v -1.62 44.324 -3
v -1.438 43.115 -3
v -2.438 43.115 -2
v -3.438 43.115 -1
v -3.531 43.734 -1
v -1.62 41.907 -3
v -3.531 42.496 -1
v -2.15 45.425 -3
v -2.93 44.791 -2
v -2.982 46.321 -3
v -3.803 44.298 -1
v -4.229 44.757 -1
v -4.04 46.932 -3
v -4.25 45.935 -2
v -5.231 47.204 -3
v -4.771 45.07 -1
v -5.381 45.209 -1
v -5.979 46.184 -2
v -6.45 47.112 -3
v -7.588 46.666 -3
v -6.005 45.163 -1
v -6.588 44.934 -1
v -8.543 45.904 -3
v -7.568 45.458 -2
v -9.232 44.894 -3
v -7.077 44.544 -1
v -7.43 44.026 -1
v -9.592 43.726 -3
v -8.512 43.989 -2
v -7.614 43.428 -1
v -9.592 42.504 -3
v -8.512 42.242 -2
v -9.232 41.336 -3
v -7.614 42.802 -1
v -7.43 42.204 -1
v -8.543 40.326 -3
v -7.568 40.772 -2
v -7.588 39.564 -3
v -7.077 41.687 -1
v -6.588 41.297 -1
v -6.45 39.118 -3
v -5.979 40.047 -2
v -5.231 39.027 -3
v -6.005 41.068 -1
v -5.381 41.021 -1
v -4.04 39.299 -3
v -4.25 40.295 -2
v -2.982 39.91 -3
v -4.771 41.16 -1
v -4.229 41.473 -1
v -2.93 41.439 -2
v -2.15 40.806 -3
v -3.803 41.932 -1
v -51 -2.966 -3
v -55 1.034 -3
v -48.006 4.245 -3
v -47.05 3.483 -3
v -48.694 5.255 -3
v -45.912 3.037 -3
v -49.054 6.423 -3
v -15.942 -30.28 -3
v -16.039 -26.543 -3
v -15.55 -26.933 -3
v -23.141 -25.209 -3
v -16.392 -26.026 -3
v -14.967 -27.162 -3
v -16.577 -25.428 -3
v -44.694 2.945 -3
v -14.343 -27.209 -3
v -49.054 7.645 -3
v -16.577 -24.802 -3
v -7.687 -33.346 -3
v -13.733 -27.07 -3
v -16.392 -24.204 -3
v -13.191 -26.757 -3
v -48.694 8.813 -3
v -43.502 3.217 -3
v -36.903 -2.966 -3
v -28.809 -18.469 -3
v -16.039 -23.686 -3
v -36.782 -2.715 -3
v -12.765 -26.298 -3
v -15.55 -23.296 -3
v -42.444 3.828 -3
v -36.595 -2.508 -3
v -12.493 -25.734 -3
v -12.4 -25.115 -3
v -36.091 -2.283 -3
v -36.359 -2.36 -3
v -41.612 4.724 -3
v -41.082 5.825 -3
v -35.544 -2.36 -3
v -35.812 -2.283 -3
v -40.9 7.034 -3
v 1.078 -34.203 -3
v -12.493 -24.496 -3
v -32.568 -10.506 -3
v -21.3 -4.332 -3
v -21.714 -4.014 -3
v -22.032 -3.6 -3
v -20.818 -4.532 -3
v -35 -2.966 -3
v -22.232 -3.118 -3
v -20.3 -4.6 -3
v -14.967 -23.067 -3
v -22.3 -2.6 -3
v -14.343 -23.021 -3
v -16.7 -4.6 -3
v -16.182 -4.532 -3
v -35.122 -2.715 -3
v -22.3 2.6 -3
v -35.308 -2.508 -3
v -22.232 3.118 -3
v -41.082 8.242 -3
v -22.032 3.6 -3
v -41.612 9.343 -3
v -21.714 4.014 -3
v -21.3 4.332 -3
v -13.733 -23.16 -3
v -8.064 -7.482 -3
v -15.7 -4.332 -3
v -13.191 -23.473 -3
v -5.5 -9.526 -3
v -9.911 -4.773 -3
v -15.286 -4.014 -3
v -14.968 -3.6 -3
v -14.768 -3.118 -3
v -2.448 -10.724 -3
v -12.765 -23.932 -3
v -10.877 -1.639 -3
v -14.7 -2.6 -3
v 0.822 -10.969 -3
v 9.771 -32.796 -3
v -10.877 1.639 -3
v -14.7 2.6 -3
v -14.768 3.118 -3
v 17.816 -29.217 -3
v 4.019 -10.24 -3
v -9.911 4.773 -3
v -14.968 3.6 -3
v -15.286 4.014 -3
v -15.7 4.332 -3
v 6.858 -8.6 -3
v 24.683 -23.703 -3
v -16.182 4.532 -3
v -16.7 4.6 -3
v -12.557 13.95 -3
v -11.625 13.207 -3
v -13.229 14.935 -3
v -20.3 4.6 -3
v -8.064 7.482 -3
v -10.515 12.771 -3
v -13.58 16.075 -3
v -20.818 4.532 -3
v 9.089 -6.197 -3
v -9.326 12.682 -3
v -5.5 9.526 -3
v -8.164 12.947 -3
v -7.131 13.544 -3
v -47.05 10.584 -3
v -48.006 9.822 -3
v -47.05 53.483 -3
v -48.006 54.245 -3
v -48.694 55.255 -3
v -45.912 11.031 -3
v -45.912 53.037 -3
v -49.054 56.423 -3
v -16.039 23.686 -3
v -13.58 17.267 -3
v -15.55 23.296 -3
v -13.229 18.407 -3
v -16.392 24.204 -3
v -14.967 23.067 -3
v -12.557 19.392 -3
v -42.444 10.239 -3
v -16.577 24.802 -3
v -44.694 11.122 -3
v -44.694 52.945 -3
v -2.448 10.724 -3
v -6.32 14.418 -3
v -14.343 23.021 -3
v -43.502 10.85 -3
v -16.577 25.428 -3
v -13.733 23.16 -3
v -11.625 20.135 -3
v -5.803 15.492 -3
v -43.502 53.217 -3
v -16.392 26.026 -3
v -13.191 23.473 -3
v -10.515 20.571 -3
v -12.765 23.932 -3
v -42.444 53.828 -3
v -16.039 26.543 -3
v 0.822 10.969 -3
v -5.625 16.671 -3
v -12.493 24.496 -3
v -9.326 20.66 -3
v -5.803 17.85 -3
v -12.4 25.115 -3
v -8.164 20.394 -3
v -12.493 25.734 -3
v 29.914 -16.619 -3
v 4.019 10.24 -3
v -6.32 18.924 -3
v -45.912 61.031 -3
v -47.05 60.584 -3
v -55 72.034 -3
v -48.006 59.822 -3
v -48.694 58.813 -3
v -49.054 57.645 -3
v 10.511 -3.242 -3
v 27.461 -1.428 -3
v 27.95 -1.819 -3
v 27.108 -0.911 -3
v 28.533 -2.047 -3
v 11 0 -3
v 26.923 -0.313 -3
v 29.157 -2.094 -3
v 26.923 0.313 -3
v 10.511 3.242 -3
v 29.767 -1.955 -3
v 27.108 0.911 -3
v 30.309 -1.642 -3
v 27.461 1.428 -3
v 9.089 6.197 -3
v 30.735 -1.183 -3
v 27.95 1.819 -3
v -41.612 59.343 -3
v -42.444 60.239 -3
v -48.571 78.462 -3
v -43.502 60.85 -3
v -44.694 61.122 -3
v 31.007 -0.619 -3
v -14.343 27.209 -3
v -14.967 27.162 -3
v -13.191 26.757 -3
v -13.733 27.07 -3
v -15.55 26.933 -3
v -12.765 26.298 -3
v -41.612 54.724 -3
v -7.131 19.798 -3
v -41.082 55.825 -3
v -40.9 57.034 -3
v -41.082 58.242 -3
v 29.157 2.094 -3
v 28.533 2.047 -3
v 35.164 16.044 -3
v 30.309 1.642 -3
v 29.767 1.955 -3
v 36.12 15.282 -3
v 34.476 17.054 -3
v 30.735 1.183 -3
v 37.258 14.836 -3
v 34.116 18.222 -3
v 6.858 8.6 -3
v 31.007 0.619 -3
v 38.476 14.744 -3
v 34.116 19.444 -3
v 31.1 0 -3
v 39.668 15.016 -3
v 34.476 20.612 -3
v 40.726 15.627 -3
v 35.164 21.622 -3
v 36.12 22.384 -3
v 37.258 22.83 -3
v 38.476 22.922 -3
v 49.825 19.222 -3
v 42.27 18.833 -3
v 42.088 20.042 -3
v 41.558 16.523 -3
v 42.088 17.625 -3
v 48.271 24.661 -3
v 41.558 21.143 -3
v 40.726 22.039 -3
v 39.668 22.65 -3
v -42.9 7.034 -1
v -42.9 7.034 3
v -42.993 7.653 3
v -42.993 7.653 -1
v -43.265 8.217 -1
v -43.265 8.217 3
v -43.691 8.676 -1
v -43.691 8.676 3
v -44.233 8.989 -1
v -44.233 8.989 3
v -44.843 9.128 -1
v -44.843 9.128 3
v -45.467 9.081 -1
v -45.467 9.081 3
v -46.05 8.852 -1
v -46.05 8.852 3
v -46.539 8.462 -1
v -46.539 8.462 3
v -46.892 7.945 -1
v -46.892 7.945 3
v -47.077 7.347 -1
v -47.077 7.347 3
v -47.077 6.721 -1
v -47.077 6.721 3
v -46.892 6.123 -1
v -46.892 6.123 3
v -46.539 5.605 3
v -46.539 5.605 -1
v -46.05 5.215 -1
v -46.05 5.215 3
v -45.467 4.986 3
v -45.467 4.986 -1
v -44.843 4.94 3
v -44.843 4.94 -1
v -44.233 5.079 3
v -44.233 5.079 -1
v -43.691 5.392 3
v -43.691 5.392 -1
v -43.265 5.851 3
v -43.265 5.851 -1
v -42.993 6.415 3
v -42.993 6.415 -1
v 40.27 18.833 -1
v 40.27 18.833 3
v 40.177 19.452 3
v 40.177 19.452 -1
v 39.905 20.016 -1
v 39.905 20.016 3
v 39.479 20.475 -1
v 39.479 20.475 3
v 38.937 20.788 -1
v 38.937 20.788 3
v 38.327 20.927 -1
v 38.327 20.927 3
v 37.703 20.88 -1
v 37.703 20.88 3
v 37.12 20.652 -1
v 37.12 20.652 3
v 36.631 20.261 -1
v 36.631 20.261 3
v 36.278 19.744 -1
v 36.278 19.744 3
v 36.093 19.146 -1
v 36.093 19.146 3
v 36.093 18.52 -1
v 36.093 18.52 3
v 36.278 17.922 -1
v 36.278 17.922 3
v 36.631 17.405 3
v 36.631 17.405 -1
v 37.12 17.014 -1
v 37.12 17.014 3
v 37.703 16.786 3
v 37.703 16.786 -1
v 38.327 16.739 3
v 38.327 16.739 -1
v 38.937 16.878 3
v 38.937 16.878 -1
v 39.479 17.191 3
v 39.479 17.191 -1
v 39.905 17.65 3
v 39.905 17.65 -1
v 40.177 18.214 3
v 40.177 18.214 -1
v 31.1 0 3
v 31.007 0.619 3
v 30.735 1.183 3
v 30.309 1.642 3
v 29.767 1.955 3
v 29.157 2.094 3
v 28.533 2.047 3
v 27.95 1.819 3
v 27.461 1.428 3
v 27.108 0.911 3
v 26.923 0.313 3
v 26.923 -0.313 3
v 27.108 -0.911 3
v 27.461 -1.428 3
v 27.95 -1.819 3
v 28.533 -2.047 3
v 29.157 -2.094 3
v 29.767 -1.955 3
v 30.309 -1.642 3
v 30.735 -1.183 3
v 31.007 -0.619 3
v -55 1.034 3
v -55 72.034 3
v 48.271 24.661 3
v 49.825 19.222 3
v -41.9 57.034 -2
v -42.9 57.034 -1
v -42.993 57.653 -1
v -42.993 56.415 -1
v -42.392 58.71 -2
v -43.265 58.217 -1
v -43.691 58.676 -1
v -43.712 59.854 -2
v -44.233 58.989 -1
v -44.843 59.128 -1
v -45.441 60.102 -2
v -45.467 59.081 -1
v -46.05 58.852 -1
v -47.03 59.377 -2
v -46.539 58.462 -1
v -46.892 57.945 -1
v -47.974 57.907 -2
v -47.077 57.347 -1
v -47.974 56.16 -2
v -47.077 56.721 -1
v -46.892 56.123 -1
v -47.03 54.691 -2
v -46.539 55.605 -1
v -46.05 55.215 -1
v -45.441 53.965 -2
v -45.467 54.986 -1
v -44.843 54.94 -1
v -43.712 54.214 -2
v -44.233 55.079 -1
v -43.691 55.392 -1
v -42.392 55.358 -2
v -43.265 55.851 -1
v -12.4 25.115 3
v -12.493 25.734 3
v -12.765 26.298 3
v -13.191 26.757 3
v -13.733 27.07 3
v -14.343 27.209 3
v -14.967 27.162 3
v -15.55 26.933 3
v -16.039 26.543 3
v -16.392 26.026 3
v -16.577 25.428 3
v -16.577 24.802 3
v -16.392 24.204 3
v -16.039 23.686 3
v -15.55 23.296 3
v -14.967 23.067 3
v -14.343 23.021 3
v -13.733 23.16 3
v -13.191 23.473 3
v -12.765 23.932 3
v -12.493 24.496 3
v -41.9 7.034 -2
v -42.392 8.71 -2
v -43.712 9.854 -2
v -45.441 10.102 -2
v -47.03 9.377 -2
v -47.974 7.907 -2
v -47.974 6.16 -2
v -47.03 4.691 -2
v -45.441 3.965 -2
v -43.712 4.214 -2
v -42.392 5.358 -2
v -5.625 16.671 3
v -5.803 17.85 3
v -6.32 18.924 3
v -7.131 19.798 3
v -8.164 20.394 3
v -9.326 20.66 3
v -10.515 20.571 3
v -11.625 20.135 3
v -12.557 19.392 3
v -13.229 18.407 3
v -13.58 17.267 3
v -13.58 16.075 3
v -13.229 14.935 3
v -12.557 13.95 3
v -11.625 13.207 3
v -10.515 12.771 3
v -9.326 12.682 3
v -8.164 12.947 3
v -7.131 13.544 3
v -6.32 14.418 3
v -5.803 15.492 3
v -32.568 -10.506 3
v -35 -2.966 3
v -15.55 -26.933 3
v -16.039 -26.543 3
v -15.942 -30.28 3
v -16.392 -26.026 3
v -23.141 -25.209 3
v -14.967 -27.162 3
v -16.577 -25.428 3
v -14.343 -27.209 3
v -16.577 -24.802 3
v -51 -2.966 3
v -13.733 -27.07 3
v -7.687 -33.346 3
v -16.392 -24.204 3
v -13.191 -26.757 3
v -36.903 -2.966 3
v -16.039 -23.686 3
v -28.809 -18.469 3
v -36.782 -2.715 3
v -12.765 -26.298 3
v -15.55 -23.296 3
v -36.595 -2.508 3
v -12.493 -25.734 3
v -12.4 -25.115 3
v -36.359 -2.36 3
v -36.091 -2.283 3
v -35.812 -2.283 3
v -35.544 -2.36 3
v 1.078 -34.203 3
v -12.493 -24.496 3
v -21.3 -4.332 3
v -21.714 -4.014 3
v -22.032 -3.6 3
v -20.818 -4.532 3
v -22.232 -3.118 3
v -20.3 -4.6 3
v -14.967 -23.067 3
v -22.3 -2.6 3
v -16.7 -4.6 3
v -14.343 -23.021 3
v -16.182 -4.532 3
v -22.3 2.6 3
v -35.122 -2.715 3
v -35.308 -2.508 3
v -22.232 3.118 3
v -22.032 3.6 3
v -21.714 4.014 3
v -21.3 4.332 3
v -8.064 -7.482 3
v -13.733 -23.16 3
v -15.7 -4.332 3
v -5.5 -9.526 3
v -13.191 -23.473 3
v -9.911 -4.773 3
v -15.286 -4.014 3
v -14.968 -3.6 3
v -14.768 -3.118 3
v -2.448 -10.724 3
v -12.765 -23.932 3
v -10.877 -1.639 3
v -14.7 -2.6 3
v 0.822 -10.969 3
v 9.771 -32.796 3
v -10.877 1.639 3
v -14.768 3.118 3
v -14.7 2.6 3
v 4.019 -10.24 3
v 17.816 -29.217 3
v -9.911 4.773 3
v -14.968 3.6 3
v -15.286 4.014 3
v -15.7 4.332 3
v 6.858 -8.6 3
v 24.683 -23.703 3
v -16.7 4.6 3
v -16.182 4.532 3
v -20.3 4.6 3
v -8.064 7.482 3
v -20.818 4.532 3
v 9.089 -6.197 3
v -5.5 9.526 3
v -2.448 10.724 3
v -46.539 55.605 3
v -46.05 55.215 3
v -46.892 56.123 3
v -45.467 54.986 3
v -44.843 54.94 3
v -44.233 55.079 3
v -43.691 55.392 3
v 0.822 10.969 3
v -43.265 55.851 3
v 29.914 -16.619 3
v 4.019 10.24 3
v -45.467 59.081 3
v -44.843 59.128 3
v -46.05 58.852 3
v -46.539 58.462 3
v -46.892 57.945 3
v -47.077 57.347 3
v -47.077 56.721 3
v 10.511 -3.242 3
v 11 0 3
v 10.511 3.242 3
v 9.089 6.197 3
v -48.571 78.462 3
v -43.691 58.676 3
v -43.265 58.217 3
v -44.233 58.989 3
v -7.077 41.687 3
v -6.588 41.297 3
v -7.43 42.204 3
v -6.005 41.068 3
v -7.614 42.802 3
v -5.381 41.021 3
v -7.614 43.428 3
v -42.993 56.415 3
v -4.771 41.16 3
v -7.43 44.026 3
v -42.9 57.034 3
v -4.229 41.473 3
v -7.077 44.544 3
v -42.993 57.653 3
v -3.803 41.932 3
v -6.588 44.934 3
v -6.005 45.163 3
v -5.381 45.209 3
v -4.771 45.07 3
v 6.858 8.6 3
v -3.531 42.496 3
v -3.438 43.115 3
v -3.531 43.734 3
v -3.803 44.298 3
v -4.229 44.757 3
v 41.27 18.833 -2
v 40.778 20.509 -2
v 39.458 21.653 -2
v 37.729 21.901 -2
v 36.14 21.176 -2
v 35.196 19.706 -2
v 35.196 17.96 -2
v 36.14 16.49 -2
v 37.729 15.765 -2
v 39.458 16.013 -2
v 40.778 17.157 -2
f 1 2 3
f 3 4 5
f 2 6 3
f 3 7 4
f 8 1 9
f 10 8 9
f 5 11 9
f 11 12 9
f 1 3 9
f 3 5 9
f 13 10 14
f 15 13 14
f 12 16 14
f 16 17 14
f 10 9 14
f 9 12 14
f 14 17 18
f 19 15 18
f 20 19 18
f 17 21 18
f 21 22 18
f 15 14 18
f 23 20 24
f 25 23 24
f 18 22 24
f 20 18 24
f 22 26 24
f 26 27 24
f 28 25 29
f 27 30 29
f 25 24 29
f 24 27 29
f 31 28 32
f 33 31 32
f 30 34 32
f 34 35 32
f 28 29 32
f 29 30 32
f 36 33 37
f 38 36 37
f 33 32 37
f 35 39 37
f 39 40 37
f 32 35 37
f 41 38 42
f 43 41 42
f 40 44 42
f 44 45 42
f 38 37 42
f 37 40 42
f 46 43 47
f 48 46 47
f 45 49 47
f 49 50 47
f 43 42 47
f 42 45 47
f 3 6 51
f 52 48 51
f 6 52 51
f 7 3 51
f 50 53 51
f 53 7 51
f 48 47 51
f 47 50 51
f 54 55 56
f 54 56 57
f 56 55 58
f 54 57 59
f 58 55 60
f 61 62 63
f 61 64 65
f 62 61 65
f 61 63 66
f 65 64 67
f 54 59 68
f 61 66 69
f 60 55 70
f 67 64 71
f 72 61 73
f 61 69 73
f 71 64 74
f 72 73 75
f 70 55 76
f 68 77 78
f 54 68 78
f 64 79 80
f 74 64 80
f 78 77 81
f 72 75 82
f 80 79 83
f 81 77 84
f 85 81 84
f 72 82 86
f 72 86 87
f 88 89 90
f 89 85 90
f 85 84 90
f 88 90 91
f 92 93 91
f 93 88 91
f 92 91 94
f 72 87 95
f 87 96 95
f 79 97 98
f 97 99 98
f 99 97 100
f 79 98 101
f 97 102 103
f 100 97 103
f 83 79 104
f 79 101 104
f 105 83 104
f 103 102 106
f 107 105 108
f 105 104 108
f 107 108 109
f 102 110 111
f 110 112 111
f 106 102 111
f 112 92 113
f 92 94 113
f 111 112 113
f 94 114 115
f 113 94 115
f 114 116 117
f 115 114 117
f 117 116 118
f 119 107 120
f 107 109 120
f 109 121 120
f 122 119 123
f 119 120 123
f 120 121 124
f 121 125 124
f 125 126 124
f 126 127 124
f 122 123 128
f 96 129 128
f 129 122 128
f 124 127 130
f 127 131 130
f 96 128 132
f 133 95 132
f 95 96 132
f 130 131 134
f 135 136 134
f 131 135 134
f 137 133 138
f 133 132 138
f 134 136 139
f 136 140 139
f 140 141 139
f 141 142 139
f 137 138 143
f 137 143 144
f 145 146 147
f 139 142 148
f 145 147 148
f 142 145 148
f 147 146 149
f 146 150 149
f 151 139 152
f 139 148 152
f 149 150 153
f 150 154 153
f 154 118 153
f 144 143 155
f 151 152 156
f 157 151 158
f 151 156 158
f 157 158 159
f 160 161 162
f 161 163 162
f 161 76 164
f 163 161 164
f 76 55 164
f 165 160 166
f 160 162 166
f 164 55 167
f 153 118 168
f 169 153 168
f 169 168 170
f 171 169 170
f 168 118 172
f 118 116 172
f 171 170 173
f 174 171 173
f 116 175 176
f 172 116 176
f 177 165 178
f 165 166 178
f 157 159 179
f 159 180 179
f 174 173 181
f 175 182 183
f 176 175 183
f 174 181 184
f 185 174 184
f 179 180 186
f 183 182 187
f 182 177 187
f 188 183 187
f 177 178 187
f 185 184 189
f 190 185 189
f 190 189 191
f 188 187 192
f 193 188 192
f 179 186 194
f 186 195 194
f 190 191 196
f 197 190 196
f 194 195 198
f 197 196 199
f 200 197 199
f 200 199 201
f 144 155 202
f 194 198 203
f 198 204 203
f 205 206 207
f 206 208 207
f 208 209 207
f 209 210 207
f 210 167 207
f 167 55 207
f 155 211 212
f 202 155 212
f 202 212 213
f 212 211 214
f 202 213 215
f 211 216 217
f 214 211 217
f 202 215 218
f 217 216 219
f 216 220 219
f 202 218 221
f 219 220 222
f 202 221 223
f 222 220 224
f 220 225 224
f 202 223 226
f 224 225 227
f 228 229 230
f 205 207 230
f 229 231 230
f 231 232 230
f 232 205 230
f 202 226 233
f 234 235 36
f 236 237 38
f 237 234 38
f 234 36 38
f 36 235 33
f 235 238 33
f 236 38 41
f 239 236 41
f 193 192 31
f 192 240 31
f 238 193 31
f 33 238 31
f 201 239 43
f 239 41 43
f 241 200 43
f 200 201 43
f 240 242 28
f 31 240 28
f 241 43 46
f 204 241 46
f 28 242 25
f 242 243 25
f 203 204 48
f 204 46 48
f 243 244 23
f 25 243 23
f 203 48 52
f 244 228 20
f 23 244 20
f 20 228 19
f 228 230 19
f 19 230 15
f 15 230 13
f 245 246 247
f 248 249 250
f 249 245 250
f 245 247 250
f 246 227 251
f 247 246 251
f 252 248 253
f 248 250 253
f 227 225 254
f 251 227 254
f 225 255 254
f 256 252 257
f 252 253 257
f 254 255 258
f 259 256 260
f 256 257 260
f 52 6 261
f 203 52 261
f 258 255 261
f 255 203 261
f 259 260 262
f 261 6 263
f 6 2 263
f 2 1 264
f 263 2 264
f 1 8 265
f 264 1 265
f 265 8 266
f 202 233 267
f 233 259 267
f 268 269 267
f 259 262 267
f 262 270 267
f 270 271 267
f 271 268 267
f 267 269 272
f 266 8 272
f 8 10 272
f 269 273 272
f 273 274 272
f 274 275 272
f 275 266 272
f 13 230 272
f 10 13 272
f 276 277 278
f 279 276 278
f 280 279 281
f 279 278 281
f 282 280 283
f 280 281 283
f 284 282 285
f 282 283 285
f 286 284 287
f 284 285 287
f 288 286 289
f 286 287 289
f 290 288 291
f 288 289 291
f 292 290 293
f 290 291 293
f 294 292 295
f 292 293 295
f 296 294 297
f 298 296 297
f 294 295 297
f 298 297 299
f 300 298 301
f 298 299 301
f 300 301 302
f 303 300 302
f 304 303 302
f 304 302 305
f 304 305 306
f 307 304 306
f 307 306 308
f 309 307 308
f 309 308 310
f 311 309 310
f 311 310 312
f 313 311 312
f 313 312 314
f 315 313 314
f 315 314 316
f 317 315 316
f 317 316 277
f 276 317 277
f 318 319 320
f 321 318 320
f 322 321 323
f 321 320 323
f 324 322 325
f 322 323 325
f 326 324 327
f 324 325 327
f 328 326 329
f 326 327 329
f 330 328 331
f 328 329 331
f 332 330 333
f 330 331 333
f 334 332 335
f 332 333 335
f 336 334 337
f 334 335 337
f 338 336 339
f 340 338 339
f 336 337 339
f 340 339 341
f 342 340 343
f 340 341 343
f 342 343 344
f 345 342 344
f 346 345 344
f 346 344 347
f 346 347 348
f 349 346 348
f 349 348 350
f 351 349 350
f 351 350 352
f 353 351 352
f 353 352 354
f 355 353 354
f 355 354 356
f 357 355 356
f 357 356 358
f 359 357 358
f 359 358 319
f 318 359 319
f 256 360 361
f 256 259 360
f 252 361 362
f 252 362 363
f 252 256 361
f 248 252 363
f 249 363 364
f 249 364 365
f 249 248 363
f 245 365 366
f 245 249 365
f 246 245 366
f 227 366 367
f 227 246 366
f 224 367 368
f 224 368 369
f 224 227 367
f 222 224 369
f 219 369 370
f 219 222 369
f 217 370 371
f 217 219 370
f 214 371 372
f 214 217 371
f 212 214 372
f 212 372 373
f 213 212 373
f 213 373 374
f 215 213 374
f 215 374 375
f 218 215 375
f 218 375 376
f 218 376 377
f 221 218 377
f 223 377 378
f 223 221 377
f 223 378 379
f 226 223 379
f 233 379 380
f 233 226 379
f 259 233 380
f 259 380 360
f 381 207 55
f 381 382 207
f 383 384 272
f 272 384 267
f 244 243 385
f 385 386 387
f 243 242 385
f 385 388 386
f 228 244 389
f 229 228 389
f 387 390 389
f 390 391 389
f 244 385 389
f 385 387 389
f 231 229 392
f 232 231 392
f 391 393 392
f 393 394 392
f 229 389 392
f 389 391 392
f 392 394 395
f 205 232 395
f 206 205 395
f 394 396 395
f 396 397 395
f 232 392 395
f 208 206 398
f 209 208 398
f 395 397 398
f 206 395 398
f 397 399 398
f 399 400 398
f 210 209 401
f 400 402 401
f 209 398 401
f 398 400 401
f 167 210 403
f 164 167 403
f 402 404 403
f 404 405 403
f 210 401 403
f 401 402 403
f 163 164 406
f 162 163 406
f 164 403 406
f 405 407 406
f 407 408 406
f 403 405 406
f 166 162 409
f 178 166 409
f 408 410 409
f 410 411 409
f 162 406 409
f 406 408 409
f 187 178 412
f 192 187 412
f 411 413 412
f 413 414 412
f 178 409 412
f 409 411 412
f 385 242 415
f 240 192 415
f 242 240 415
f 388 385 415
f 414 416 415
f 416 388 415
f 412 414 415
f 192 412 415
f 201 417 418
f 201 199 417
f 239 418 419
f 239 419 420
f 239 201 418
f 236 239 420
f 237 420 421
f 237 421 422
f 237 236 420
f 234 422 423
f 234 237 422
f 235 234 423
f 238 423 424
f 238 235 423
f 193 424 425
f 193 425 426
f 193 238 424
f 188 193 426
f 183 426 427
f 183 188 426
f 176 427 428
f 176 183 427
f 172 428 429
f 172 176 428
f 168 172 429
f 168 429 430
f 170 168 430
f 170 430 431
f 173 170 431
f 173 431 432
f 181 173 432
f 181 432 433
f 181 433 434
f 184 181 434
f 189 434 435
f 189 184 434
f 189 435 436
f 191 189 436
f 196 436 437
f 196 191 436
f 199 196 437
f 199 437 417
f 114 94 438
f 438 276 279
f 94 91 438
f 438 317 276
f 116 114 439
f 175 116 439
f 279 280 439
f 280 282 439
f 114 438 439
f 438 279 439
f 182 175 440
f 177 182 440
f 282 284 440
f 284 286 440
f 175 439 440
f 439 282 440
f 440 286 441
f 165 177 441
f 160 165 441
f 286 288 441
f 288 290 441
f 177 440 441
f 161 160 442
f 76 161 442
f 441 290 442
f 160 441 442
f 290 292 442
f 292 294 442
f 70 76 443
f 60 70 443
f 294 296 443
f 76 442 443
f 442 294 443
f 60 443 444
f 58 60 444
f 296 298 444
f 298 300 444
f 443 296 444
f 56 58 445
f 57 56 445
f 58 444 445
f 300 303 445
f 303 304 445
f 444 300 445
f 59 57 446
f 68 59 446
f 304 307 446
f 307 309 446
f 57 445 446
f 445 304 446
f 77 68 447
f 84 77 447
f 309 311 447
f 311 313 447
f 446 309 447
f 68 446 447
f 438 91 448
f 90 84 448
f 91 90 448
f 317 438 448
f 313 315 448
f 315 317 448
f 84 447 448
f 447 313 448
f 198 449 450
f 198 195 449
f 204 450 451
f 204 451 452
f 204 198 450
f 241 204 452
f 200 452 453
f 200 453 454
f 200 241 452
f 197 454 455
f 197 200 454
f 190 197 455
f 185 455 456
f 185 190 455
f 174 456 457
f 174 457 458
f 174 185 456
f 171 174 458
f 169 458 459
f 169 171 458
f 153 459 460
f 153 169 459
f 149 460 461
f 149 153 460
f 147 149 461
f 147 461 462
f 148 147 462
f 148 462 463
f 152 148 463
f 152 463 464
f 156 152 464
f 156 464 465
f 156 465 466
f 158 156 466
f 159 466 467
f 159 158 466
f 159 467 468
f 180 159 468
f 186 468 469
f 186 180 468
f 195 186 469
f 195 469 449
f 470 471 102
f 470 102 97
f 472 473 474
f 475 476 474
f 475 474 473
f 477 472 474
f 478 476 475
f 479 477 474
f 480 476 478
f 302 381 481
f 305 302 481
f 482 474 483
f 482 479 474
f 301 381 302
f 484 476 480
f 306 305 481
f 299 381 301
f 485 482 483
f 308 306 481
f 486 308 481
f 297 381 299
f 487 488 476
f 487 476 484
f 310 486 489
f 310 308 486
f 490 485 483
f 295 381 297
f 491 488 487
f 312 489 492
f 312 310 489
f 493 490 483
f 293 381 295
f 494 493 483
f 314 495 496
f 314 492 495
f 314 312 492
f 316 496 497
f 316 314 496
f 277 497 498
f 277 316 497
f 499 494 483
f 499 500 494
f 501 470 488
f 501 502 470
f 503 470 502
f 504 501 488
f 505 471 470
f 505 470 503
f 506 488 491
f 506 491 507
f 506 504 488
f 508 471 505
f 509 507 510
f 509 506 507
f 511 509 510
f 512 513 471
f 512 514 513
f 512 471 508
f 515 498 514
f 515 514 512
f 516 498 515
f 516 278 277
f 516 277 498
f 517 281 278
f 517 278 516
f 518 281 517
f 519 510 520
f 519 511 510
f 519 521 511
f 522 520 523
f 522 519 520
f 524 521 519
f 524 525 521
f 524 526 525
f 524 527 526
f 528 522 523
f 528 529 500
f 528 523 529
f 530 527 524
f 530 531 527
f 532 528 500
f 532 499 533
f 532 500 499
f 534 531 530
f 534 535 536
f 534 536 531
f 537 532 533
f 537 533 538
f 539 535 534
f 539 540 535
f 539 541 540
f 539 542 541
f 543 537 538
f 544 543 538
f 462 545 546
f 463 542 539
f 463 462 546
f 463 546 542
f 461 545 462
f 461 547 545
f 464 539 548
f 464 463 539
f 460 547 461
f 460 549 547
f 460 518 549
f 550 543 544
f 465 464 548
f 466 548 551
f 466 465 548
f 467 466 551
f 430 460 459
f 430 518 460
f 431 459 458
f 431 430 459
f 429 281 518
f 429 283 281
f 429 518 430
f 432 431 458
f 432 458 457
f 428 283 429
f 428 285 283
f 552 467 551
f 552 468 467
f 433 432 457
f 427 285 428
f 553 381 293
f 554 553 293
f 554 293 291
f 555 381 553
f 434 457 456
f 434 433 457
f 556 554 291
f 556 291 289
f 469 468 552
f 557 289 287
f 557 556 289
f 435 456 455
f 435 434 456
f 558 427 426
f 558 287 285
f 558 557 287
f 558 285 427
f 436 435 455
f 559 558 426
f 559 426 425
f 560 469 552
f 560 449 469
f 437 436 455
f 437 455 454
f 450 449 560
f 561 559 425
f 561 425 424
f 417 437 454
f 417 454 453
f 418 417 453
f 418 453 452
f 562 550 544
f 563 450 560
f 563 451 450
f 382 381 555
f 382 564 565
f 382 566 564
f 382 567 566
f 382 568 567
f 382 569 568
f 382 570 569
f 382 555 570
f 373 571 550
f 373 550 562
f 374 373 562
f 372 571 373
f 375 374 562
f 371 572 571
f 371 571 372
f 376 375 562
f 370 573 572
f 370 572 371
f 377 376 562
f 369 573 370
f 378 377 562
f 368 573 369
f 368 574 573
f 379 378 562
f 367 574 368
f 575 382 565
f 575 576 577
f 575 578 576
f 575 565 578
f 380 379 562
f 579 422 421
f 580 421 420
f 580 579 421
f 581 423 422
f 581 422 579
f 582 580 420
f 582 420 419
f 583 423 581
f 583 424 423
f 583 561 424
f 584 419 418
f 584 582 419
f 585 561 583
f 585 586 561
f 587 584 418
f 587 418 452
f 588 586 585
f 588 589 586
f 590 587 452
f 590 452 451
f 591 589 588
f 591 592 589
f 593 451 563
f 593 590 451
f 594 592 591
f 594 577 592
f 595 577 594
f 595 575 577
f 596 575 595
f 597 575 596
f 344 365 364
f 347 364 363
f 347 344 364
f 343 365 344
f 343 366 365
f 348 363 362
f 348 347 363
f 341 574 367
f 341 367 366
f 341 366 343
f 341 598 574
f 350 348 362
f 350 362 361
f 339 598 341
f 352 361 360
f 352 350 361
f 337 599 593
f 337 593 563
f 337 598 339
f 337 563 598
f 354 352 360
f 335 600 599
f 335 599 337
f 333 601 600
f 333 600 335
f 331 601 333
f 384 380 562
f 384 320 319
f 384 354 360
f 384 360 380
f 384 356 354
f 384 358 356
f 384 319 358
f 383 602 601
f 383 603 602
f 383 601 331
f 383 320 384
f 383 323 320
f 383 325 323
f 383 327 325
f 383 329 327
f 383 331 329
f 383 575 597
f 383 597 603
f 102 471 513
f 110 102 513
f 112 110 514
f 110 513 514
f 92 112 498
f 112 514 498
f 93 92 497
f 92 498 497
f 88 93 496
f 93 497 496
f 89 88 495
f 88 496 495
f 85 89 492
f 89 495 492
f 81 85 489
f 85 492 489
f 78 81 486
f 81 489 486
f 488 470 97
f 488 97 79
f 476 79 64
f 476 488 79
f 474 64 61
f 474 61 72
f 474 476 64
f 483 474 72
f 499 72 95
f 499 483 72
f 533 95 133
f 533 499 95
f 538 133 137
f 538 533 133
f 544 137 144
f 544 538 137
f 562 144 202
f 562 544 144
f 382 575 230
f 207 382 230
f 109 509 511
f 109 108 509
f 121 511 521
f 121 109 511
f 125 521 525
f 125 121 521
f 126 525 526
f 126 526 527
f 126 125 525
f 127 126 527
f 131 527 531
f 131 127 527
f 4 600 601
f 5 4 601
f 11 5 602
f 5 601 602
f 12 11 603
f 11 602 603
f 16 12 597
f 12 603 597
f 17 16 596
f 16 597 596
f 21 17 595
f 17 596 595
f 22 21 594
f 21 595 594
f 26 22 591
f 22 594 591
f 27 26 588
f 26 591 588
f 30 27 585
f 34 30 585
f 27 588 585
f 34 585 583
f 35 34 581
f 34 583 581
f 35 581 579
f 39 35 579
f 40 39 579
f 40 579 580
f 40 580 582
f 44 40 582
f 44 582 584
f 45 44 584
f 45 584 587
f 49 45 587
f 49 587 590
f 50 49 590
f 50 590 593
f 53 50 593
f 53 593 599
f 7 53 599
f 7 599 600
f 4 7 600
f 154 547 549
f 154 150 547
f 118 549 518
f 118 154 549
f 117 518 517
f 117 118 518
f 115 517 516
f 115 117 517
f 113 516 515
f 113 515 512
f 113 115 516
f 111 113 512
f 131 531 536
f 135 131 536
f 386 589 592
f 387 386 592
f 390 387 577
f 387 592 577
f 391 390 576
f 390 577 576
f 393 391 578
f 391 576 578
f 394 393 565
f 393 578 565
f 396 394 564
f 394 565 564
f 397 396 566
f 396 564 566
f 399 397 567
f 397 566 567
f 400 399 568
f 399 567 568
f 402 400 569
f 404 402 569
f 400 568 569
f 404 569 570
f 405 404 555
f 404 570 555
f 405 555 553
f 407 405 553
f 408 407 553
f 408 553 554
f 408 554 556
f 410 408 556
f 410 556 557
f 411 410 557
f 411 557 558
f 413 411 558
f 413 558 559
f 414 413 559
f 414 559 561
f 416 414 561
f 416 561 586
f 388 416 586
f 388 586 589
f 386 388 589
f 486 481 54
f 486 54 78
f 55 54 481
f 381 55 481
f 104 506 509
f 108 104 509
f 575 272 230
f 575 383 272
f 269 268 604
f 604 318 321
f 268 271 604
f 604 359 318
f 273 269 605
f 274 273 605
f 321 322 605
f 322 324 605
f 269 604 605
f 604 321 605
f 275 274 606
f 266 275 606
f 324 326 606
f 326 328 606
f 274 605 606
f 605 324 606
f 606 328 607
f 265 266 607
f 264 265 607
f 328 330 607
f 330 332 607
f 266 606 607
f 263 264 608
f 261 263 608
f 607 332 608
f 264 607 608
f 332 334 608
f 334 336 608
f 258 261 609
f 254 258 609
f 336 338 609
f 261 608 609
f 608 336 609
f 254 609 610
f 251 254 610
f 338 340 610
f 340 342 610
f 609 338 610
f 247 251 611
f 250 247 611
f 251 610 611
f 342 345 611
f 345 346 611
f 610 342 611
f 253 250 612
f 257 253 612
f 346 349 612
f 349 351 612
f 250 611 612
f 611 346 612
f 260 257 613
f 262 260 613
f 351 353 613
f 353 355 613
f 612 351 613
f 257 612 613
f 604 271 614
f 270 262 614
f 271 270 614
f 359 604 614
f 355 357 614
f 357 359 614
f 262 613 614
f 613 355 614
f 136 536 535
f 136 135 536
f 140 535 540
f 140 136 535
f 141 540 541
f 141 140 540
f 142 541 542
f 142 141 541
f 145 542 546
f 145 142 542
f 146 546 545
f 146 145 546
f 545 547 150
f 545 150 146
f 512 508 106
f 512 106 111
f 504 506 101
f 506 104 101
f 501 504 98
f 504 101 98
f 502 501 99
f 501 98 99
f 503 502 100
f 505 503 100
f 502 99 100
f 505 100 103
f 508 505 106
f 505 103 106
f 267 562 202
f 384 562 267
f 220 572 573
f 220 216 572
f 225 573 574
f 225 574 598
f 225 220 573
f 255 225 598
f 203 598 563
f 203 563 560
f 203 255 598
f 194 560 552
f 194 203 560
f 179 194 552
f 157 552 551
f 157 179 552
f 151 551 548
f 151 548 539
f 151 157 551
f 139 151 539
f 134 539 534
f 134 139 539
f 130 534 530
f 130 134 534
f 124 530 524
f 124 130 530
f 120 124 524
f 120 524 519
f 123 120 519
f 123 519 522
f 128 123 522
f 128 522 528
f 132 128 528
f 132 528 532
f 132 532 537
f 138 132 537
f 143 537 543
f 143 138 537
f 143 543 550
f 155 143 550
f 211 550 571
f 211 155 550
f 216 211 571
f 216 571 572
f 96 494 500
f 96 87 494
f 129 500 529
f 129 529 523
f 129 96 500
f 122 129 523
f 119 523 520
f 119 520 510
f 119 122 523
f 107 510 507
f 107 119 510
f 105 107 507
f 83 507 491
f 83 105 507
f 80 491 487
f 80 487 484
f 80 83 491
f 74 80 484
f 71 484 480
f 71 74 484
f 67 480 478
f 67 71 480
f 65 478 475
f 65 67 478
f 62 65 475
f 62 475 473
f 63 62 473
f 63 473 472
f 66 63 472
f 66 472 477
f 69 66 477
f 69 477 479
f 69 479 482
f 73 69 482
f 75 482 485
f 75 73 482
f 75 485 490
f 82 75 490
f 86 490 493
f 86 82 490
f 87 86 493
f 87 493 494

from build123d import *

# Parameters (mm, degrees)
SKETCH_1_R          = 2.1
SKETCH_1_R_2        = 4
SKETCH_1_R_3        = 11
EXTRUDE_1_DEPTH     = 3
SKETCH_3_R          = 1
SKETCH_3_R_2        = 2.1
CUT_EXTRUDE_1_DEPTH = 99.947101842
CHAMFER_2_SIZE      = 4
CHAMFER_3_SIZE      = 10
CHAMFER_3_SIZE2     = 7.354021529
SKETCH_4_W          = 7.6
SKETCH_4_H          = 9.2
CUT_EXTRUDE_2_DEPTH = 97.00692173
FILLET_1_R          = 2
SKETCH_5_R          = 2.1
CUT_EXTRUDE_3_DEPTH = 97.00692173
CHAMFER_1_SIZE      = 2


with BuildPart() as part:
    # 草图1 → 凸台-拉伸1 (new, symmetric)
    with BuildSketch(Plane.XY):
        with BuildLine():
            Line((-55, 82.03370626), (-55, -2.96629374))
            Line((-55, -2.96629374), (-35, -2.96629374))
            Line((-35, -2.96629374), (-32.567908633, -10.505776978))
            ThreePointArc((-32.567908633, -10.505776978), (-3.332171442, -34.057842799), (29.91406589, -16.618925494))
            Line((29.91406589, -16.618925494), (51.767997793, 22.718151931))
            Line((51.767997793, 22.718151931), (-55, 82.03370626))
        make_face()
        with Locations((29, 0)):
            Circle(SKETCH_1_R, mode=Mode.SUBTRACT)
        with Locations((-14.5, -25.11473671)):
            Circle(SKETCH_1_R, mode=Mode.SUBTRACT)
        with Locations((-14.5, 25.11473671)):
            Circle(SKETCH_1_R, mode=Mode.SUBTRACT)
        with Locations((-9.625, 16.670989023)):
            Circle(SKETCH_1_R_2, mode=Mode.SUBTRACT)
        Circle(SKETCH_1_R_3, mode=Mode.SUBTRACT)
    extrude(amount=EXTRUDE_1_DEPTH, both=True)

    # 草图3 → 切除-拉伸1 (cut, through all)
    with BuildSketch(Plane.XY.offset(3)):
        with Locations((-35.951708618, -3.273296519)):
            Circle(SKETCH_3_R)
        with Locations((-45, 7.03370626)):
            Circle(SKETCH_3_R_2)
        with Locations((-45, 57.03370626)):
            Circle(SKETCH_3_R_2)
    extrude(amount=-CUT_EXTRUDE_1_DEPTH, mode=Mode.SUBTRACT)

    # 倒角2
    chamfer_2_edges = [part.edges().sort_by_distance(p)[0] for p in [
        (51.767997793, 22.718151931, 0),
        (-55, -2.96629374, 0),
    ]]
    chamfer(chamfer_2_edges, length=CHAMFER_2_SIZE)

    # 倒角3
    chamfer_3_edges = [part.edges().sort_by_distance(p)[0] for p in [
        (-55, 82.03370626, 0),
    ]]
    chamfer_3_side = [part.faces().sort_by_distance(p)[0] for p in [
        (-55, 41.53370626, 0),
    ]]
    chamfer(chamfer_3_edges, length=CHAMFER_3_SIZE, length2=CHAMFER_3_SIZE2, reference=chamfer_3_side[0])

    # 草图4 → 切除-拉伸2 (cut, through all)
    with BuildSketch(Plane.XY.offset(3)):
        with Locations((-18.5, 0)):
            Rectangle(SKETCH_4_W, SKETCH_4_H)
    extrude(amount=-CUT_EXTRUDE_2_DEPTH, mode=Mode.SUBTRACT)

    # 圆角1
    fillet_1_edges = [part.edges().sort_by_distance(p)[0] for p in [
        (-14.7, 4.6, 0),
        (-14.7, -4.6, 0),
        (-22.3, -4.6, 0),
        (-22.3, 4.6, 0),
    ]]
    fillet(fillet_1_edges, radius=FILLET_1_R)

    # 草图5 → 切除-拉伸3 (cut, through all)
    with BuildSketch(Plane.XY.offset(3)):
        with Locations((-5.537868087, 43.115155041)):
            Circle(SKETCH_5_R)
        with Locations((38.16999572, 18.833008482)):
            Circle(SKETCH_5_R)
    extrude(amount=-CUT_EXTRUDE_3_DEPTH, mode=Mode.SUBTRACT)

    # 倒角1
    chamfer_1_edges = [part.edges().sort_by_distance(p)[0] for p in [
        (-7.637868087, 43.115155041, -3),
        (36.06999572, 18.833008482, -3),
        (-47.1, 7.03370626, -3),
        (-47.1, 57.03370626, -3),
    ]]
    chamfer(chamfer_1_edges, length=CHAMFER_1_SIZE)


solid = part.part
